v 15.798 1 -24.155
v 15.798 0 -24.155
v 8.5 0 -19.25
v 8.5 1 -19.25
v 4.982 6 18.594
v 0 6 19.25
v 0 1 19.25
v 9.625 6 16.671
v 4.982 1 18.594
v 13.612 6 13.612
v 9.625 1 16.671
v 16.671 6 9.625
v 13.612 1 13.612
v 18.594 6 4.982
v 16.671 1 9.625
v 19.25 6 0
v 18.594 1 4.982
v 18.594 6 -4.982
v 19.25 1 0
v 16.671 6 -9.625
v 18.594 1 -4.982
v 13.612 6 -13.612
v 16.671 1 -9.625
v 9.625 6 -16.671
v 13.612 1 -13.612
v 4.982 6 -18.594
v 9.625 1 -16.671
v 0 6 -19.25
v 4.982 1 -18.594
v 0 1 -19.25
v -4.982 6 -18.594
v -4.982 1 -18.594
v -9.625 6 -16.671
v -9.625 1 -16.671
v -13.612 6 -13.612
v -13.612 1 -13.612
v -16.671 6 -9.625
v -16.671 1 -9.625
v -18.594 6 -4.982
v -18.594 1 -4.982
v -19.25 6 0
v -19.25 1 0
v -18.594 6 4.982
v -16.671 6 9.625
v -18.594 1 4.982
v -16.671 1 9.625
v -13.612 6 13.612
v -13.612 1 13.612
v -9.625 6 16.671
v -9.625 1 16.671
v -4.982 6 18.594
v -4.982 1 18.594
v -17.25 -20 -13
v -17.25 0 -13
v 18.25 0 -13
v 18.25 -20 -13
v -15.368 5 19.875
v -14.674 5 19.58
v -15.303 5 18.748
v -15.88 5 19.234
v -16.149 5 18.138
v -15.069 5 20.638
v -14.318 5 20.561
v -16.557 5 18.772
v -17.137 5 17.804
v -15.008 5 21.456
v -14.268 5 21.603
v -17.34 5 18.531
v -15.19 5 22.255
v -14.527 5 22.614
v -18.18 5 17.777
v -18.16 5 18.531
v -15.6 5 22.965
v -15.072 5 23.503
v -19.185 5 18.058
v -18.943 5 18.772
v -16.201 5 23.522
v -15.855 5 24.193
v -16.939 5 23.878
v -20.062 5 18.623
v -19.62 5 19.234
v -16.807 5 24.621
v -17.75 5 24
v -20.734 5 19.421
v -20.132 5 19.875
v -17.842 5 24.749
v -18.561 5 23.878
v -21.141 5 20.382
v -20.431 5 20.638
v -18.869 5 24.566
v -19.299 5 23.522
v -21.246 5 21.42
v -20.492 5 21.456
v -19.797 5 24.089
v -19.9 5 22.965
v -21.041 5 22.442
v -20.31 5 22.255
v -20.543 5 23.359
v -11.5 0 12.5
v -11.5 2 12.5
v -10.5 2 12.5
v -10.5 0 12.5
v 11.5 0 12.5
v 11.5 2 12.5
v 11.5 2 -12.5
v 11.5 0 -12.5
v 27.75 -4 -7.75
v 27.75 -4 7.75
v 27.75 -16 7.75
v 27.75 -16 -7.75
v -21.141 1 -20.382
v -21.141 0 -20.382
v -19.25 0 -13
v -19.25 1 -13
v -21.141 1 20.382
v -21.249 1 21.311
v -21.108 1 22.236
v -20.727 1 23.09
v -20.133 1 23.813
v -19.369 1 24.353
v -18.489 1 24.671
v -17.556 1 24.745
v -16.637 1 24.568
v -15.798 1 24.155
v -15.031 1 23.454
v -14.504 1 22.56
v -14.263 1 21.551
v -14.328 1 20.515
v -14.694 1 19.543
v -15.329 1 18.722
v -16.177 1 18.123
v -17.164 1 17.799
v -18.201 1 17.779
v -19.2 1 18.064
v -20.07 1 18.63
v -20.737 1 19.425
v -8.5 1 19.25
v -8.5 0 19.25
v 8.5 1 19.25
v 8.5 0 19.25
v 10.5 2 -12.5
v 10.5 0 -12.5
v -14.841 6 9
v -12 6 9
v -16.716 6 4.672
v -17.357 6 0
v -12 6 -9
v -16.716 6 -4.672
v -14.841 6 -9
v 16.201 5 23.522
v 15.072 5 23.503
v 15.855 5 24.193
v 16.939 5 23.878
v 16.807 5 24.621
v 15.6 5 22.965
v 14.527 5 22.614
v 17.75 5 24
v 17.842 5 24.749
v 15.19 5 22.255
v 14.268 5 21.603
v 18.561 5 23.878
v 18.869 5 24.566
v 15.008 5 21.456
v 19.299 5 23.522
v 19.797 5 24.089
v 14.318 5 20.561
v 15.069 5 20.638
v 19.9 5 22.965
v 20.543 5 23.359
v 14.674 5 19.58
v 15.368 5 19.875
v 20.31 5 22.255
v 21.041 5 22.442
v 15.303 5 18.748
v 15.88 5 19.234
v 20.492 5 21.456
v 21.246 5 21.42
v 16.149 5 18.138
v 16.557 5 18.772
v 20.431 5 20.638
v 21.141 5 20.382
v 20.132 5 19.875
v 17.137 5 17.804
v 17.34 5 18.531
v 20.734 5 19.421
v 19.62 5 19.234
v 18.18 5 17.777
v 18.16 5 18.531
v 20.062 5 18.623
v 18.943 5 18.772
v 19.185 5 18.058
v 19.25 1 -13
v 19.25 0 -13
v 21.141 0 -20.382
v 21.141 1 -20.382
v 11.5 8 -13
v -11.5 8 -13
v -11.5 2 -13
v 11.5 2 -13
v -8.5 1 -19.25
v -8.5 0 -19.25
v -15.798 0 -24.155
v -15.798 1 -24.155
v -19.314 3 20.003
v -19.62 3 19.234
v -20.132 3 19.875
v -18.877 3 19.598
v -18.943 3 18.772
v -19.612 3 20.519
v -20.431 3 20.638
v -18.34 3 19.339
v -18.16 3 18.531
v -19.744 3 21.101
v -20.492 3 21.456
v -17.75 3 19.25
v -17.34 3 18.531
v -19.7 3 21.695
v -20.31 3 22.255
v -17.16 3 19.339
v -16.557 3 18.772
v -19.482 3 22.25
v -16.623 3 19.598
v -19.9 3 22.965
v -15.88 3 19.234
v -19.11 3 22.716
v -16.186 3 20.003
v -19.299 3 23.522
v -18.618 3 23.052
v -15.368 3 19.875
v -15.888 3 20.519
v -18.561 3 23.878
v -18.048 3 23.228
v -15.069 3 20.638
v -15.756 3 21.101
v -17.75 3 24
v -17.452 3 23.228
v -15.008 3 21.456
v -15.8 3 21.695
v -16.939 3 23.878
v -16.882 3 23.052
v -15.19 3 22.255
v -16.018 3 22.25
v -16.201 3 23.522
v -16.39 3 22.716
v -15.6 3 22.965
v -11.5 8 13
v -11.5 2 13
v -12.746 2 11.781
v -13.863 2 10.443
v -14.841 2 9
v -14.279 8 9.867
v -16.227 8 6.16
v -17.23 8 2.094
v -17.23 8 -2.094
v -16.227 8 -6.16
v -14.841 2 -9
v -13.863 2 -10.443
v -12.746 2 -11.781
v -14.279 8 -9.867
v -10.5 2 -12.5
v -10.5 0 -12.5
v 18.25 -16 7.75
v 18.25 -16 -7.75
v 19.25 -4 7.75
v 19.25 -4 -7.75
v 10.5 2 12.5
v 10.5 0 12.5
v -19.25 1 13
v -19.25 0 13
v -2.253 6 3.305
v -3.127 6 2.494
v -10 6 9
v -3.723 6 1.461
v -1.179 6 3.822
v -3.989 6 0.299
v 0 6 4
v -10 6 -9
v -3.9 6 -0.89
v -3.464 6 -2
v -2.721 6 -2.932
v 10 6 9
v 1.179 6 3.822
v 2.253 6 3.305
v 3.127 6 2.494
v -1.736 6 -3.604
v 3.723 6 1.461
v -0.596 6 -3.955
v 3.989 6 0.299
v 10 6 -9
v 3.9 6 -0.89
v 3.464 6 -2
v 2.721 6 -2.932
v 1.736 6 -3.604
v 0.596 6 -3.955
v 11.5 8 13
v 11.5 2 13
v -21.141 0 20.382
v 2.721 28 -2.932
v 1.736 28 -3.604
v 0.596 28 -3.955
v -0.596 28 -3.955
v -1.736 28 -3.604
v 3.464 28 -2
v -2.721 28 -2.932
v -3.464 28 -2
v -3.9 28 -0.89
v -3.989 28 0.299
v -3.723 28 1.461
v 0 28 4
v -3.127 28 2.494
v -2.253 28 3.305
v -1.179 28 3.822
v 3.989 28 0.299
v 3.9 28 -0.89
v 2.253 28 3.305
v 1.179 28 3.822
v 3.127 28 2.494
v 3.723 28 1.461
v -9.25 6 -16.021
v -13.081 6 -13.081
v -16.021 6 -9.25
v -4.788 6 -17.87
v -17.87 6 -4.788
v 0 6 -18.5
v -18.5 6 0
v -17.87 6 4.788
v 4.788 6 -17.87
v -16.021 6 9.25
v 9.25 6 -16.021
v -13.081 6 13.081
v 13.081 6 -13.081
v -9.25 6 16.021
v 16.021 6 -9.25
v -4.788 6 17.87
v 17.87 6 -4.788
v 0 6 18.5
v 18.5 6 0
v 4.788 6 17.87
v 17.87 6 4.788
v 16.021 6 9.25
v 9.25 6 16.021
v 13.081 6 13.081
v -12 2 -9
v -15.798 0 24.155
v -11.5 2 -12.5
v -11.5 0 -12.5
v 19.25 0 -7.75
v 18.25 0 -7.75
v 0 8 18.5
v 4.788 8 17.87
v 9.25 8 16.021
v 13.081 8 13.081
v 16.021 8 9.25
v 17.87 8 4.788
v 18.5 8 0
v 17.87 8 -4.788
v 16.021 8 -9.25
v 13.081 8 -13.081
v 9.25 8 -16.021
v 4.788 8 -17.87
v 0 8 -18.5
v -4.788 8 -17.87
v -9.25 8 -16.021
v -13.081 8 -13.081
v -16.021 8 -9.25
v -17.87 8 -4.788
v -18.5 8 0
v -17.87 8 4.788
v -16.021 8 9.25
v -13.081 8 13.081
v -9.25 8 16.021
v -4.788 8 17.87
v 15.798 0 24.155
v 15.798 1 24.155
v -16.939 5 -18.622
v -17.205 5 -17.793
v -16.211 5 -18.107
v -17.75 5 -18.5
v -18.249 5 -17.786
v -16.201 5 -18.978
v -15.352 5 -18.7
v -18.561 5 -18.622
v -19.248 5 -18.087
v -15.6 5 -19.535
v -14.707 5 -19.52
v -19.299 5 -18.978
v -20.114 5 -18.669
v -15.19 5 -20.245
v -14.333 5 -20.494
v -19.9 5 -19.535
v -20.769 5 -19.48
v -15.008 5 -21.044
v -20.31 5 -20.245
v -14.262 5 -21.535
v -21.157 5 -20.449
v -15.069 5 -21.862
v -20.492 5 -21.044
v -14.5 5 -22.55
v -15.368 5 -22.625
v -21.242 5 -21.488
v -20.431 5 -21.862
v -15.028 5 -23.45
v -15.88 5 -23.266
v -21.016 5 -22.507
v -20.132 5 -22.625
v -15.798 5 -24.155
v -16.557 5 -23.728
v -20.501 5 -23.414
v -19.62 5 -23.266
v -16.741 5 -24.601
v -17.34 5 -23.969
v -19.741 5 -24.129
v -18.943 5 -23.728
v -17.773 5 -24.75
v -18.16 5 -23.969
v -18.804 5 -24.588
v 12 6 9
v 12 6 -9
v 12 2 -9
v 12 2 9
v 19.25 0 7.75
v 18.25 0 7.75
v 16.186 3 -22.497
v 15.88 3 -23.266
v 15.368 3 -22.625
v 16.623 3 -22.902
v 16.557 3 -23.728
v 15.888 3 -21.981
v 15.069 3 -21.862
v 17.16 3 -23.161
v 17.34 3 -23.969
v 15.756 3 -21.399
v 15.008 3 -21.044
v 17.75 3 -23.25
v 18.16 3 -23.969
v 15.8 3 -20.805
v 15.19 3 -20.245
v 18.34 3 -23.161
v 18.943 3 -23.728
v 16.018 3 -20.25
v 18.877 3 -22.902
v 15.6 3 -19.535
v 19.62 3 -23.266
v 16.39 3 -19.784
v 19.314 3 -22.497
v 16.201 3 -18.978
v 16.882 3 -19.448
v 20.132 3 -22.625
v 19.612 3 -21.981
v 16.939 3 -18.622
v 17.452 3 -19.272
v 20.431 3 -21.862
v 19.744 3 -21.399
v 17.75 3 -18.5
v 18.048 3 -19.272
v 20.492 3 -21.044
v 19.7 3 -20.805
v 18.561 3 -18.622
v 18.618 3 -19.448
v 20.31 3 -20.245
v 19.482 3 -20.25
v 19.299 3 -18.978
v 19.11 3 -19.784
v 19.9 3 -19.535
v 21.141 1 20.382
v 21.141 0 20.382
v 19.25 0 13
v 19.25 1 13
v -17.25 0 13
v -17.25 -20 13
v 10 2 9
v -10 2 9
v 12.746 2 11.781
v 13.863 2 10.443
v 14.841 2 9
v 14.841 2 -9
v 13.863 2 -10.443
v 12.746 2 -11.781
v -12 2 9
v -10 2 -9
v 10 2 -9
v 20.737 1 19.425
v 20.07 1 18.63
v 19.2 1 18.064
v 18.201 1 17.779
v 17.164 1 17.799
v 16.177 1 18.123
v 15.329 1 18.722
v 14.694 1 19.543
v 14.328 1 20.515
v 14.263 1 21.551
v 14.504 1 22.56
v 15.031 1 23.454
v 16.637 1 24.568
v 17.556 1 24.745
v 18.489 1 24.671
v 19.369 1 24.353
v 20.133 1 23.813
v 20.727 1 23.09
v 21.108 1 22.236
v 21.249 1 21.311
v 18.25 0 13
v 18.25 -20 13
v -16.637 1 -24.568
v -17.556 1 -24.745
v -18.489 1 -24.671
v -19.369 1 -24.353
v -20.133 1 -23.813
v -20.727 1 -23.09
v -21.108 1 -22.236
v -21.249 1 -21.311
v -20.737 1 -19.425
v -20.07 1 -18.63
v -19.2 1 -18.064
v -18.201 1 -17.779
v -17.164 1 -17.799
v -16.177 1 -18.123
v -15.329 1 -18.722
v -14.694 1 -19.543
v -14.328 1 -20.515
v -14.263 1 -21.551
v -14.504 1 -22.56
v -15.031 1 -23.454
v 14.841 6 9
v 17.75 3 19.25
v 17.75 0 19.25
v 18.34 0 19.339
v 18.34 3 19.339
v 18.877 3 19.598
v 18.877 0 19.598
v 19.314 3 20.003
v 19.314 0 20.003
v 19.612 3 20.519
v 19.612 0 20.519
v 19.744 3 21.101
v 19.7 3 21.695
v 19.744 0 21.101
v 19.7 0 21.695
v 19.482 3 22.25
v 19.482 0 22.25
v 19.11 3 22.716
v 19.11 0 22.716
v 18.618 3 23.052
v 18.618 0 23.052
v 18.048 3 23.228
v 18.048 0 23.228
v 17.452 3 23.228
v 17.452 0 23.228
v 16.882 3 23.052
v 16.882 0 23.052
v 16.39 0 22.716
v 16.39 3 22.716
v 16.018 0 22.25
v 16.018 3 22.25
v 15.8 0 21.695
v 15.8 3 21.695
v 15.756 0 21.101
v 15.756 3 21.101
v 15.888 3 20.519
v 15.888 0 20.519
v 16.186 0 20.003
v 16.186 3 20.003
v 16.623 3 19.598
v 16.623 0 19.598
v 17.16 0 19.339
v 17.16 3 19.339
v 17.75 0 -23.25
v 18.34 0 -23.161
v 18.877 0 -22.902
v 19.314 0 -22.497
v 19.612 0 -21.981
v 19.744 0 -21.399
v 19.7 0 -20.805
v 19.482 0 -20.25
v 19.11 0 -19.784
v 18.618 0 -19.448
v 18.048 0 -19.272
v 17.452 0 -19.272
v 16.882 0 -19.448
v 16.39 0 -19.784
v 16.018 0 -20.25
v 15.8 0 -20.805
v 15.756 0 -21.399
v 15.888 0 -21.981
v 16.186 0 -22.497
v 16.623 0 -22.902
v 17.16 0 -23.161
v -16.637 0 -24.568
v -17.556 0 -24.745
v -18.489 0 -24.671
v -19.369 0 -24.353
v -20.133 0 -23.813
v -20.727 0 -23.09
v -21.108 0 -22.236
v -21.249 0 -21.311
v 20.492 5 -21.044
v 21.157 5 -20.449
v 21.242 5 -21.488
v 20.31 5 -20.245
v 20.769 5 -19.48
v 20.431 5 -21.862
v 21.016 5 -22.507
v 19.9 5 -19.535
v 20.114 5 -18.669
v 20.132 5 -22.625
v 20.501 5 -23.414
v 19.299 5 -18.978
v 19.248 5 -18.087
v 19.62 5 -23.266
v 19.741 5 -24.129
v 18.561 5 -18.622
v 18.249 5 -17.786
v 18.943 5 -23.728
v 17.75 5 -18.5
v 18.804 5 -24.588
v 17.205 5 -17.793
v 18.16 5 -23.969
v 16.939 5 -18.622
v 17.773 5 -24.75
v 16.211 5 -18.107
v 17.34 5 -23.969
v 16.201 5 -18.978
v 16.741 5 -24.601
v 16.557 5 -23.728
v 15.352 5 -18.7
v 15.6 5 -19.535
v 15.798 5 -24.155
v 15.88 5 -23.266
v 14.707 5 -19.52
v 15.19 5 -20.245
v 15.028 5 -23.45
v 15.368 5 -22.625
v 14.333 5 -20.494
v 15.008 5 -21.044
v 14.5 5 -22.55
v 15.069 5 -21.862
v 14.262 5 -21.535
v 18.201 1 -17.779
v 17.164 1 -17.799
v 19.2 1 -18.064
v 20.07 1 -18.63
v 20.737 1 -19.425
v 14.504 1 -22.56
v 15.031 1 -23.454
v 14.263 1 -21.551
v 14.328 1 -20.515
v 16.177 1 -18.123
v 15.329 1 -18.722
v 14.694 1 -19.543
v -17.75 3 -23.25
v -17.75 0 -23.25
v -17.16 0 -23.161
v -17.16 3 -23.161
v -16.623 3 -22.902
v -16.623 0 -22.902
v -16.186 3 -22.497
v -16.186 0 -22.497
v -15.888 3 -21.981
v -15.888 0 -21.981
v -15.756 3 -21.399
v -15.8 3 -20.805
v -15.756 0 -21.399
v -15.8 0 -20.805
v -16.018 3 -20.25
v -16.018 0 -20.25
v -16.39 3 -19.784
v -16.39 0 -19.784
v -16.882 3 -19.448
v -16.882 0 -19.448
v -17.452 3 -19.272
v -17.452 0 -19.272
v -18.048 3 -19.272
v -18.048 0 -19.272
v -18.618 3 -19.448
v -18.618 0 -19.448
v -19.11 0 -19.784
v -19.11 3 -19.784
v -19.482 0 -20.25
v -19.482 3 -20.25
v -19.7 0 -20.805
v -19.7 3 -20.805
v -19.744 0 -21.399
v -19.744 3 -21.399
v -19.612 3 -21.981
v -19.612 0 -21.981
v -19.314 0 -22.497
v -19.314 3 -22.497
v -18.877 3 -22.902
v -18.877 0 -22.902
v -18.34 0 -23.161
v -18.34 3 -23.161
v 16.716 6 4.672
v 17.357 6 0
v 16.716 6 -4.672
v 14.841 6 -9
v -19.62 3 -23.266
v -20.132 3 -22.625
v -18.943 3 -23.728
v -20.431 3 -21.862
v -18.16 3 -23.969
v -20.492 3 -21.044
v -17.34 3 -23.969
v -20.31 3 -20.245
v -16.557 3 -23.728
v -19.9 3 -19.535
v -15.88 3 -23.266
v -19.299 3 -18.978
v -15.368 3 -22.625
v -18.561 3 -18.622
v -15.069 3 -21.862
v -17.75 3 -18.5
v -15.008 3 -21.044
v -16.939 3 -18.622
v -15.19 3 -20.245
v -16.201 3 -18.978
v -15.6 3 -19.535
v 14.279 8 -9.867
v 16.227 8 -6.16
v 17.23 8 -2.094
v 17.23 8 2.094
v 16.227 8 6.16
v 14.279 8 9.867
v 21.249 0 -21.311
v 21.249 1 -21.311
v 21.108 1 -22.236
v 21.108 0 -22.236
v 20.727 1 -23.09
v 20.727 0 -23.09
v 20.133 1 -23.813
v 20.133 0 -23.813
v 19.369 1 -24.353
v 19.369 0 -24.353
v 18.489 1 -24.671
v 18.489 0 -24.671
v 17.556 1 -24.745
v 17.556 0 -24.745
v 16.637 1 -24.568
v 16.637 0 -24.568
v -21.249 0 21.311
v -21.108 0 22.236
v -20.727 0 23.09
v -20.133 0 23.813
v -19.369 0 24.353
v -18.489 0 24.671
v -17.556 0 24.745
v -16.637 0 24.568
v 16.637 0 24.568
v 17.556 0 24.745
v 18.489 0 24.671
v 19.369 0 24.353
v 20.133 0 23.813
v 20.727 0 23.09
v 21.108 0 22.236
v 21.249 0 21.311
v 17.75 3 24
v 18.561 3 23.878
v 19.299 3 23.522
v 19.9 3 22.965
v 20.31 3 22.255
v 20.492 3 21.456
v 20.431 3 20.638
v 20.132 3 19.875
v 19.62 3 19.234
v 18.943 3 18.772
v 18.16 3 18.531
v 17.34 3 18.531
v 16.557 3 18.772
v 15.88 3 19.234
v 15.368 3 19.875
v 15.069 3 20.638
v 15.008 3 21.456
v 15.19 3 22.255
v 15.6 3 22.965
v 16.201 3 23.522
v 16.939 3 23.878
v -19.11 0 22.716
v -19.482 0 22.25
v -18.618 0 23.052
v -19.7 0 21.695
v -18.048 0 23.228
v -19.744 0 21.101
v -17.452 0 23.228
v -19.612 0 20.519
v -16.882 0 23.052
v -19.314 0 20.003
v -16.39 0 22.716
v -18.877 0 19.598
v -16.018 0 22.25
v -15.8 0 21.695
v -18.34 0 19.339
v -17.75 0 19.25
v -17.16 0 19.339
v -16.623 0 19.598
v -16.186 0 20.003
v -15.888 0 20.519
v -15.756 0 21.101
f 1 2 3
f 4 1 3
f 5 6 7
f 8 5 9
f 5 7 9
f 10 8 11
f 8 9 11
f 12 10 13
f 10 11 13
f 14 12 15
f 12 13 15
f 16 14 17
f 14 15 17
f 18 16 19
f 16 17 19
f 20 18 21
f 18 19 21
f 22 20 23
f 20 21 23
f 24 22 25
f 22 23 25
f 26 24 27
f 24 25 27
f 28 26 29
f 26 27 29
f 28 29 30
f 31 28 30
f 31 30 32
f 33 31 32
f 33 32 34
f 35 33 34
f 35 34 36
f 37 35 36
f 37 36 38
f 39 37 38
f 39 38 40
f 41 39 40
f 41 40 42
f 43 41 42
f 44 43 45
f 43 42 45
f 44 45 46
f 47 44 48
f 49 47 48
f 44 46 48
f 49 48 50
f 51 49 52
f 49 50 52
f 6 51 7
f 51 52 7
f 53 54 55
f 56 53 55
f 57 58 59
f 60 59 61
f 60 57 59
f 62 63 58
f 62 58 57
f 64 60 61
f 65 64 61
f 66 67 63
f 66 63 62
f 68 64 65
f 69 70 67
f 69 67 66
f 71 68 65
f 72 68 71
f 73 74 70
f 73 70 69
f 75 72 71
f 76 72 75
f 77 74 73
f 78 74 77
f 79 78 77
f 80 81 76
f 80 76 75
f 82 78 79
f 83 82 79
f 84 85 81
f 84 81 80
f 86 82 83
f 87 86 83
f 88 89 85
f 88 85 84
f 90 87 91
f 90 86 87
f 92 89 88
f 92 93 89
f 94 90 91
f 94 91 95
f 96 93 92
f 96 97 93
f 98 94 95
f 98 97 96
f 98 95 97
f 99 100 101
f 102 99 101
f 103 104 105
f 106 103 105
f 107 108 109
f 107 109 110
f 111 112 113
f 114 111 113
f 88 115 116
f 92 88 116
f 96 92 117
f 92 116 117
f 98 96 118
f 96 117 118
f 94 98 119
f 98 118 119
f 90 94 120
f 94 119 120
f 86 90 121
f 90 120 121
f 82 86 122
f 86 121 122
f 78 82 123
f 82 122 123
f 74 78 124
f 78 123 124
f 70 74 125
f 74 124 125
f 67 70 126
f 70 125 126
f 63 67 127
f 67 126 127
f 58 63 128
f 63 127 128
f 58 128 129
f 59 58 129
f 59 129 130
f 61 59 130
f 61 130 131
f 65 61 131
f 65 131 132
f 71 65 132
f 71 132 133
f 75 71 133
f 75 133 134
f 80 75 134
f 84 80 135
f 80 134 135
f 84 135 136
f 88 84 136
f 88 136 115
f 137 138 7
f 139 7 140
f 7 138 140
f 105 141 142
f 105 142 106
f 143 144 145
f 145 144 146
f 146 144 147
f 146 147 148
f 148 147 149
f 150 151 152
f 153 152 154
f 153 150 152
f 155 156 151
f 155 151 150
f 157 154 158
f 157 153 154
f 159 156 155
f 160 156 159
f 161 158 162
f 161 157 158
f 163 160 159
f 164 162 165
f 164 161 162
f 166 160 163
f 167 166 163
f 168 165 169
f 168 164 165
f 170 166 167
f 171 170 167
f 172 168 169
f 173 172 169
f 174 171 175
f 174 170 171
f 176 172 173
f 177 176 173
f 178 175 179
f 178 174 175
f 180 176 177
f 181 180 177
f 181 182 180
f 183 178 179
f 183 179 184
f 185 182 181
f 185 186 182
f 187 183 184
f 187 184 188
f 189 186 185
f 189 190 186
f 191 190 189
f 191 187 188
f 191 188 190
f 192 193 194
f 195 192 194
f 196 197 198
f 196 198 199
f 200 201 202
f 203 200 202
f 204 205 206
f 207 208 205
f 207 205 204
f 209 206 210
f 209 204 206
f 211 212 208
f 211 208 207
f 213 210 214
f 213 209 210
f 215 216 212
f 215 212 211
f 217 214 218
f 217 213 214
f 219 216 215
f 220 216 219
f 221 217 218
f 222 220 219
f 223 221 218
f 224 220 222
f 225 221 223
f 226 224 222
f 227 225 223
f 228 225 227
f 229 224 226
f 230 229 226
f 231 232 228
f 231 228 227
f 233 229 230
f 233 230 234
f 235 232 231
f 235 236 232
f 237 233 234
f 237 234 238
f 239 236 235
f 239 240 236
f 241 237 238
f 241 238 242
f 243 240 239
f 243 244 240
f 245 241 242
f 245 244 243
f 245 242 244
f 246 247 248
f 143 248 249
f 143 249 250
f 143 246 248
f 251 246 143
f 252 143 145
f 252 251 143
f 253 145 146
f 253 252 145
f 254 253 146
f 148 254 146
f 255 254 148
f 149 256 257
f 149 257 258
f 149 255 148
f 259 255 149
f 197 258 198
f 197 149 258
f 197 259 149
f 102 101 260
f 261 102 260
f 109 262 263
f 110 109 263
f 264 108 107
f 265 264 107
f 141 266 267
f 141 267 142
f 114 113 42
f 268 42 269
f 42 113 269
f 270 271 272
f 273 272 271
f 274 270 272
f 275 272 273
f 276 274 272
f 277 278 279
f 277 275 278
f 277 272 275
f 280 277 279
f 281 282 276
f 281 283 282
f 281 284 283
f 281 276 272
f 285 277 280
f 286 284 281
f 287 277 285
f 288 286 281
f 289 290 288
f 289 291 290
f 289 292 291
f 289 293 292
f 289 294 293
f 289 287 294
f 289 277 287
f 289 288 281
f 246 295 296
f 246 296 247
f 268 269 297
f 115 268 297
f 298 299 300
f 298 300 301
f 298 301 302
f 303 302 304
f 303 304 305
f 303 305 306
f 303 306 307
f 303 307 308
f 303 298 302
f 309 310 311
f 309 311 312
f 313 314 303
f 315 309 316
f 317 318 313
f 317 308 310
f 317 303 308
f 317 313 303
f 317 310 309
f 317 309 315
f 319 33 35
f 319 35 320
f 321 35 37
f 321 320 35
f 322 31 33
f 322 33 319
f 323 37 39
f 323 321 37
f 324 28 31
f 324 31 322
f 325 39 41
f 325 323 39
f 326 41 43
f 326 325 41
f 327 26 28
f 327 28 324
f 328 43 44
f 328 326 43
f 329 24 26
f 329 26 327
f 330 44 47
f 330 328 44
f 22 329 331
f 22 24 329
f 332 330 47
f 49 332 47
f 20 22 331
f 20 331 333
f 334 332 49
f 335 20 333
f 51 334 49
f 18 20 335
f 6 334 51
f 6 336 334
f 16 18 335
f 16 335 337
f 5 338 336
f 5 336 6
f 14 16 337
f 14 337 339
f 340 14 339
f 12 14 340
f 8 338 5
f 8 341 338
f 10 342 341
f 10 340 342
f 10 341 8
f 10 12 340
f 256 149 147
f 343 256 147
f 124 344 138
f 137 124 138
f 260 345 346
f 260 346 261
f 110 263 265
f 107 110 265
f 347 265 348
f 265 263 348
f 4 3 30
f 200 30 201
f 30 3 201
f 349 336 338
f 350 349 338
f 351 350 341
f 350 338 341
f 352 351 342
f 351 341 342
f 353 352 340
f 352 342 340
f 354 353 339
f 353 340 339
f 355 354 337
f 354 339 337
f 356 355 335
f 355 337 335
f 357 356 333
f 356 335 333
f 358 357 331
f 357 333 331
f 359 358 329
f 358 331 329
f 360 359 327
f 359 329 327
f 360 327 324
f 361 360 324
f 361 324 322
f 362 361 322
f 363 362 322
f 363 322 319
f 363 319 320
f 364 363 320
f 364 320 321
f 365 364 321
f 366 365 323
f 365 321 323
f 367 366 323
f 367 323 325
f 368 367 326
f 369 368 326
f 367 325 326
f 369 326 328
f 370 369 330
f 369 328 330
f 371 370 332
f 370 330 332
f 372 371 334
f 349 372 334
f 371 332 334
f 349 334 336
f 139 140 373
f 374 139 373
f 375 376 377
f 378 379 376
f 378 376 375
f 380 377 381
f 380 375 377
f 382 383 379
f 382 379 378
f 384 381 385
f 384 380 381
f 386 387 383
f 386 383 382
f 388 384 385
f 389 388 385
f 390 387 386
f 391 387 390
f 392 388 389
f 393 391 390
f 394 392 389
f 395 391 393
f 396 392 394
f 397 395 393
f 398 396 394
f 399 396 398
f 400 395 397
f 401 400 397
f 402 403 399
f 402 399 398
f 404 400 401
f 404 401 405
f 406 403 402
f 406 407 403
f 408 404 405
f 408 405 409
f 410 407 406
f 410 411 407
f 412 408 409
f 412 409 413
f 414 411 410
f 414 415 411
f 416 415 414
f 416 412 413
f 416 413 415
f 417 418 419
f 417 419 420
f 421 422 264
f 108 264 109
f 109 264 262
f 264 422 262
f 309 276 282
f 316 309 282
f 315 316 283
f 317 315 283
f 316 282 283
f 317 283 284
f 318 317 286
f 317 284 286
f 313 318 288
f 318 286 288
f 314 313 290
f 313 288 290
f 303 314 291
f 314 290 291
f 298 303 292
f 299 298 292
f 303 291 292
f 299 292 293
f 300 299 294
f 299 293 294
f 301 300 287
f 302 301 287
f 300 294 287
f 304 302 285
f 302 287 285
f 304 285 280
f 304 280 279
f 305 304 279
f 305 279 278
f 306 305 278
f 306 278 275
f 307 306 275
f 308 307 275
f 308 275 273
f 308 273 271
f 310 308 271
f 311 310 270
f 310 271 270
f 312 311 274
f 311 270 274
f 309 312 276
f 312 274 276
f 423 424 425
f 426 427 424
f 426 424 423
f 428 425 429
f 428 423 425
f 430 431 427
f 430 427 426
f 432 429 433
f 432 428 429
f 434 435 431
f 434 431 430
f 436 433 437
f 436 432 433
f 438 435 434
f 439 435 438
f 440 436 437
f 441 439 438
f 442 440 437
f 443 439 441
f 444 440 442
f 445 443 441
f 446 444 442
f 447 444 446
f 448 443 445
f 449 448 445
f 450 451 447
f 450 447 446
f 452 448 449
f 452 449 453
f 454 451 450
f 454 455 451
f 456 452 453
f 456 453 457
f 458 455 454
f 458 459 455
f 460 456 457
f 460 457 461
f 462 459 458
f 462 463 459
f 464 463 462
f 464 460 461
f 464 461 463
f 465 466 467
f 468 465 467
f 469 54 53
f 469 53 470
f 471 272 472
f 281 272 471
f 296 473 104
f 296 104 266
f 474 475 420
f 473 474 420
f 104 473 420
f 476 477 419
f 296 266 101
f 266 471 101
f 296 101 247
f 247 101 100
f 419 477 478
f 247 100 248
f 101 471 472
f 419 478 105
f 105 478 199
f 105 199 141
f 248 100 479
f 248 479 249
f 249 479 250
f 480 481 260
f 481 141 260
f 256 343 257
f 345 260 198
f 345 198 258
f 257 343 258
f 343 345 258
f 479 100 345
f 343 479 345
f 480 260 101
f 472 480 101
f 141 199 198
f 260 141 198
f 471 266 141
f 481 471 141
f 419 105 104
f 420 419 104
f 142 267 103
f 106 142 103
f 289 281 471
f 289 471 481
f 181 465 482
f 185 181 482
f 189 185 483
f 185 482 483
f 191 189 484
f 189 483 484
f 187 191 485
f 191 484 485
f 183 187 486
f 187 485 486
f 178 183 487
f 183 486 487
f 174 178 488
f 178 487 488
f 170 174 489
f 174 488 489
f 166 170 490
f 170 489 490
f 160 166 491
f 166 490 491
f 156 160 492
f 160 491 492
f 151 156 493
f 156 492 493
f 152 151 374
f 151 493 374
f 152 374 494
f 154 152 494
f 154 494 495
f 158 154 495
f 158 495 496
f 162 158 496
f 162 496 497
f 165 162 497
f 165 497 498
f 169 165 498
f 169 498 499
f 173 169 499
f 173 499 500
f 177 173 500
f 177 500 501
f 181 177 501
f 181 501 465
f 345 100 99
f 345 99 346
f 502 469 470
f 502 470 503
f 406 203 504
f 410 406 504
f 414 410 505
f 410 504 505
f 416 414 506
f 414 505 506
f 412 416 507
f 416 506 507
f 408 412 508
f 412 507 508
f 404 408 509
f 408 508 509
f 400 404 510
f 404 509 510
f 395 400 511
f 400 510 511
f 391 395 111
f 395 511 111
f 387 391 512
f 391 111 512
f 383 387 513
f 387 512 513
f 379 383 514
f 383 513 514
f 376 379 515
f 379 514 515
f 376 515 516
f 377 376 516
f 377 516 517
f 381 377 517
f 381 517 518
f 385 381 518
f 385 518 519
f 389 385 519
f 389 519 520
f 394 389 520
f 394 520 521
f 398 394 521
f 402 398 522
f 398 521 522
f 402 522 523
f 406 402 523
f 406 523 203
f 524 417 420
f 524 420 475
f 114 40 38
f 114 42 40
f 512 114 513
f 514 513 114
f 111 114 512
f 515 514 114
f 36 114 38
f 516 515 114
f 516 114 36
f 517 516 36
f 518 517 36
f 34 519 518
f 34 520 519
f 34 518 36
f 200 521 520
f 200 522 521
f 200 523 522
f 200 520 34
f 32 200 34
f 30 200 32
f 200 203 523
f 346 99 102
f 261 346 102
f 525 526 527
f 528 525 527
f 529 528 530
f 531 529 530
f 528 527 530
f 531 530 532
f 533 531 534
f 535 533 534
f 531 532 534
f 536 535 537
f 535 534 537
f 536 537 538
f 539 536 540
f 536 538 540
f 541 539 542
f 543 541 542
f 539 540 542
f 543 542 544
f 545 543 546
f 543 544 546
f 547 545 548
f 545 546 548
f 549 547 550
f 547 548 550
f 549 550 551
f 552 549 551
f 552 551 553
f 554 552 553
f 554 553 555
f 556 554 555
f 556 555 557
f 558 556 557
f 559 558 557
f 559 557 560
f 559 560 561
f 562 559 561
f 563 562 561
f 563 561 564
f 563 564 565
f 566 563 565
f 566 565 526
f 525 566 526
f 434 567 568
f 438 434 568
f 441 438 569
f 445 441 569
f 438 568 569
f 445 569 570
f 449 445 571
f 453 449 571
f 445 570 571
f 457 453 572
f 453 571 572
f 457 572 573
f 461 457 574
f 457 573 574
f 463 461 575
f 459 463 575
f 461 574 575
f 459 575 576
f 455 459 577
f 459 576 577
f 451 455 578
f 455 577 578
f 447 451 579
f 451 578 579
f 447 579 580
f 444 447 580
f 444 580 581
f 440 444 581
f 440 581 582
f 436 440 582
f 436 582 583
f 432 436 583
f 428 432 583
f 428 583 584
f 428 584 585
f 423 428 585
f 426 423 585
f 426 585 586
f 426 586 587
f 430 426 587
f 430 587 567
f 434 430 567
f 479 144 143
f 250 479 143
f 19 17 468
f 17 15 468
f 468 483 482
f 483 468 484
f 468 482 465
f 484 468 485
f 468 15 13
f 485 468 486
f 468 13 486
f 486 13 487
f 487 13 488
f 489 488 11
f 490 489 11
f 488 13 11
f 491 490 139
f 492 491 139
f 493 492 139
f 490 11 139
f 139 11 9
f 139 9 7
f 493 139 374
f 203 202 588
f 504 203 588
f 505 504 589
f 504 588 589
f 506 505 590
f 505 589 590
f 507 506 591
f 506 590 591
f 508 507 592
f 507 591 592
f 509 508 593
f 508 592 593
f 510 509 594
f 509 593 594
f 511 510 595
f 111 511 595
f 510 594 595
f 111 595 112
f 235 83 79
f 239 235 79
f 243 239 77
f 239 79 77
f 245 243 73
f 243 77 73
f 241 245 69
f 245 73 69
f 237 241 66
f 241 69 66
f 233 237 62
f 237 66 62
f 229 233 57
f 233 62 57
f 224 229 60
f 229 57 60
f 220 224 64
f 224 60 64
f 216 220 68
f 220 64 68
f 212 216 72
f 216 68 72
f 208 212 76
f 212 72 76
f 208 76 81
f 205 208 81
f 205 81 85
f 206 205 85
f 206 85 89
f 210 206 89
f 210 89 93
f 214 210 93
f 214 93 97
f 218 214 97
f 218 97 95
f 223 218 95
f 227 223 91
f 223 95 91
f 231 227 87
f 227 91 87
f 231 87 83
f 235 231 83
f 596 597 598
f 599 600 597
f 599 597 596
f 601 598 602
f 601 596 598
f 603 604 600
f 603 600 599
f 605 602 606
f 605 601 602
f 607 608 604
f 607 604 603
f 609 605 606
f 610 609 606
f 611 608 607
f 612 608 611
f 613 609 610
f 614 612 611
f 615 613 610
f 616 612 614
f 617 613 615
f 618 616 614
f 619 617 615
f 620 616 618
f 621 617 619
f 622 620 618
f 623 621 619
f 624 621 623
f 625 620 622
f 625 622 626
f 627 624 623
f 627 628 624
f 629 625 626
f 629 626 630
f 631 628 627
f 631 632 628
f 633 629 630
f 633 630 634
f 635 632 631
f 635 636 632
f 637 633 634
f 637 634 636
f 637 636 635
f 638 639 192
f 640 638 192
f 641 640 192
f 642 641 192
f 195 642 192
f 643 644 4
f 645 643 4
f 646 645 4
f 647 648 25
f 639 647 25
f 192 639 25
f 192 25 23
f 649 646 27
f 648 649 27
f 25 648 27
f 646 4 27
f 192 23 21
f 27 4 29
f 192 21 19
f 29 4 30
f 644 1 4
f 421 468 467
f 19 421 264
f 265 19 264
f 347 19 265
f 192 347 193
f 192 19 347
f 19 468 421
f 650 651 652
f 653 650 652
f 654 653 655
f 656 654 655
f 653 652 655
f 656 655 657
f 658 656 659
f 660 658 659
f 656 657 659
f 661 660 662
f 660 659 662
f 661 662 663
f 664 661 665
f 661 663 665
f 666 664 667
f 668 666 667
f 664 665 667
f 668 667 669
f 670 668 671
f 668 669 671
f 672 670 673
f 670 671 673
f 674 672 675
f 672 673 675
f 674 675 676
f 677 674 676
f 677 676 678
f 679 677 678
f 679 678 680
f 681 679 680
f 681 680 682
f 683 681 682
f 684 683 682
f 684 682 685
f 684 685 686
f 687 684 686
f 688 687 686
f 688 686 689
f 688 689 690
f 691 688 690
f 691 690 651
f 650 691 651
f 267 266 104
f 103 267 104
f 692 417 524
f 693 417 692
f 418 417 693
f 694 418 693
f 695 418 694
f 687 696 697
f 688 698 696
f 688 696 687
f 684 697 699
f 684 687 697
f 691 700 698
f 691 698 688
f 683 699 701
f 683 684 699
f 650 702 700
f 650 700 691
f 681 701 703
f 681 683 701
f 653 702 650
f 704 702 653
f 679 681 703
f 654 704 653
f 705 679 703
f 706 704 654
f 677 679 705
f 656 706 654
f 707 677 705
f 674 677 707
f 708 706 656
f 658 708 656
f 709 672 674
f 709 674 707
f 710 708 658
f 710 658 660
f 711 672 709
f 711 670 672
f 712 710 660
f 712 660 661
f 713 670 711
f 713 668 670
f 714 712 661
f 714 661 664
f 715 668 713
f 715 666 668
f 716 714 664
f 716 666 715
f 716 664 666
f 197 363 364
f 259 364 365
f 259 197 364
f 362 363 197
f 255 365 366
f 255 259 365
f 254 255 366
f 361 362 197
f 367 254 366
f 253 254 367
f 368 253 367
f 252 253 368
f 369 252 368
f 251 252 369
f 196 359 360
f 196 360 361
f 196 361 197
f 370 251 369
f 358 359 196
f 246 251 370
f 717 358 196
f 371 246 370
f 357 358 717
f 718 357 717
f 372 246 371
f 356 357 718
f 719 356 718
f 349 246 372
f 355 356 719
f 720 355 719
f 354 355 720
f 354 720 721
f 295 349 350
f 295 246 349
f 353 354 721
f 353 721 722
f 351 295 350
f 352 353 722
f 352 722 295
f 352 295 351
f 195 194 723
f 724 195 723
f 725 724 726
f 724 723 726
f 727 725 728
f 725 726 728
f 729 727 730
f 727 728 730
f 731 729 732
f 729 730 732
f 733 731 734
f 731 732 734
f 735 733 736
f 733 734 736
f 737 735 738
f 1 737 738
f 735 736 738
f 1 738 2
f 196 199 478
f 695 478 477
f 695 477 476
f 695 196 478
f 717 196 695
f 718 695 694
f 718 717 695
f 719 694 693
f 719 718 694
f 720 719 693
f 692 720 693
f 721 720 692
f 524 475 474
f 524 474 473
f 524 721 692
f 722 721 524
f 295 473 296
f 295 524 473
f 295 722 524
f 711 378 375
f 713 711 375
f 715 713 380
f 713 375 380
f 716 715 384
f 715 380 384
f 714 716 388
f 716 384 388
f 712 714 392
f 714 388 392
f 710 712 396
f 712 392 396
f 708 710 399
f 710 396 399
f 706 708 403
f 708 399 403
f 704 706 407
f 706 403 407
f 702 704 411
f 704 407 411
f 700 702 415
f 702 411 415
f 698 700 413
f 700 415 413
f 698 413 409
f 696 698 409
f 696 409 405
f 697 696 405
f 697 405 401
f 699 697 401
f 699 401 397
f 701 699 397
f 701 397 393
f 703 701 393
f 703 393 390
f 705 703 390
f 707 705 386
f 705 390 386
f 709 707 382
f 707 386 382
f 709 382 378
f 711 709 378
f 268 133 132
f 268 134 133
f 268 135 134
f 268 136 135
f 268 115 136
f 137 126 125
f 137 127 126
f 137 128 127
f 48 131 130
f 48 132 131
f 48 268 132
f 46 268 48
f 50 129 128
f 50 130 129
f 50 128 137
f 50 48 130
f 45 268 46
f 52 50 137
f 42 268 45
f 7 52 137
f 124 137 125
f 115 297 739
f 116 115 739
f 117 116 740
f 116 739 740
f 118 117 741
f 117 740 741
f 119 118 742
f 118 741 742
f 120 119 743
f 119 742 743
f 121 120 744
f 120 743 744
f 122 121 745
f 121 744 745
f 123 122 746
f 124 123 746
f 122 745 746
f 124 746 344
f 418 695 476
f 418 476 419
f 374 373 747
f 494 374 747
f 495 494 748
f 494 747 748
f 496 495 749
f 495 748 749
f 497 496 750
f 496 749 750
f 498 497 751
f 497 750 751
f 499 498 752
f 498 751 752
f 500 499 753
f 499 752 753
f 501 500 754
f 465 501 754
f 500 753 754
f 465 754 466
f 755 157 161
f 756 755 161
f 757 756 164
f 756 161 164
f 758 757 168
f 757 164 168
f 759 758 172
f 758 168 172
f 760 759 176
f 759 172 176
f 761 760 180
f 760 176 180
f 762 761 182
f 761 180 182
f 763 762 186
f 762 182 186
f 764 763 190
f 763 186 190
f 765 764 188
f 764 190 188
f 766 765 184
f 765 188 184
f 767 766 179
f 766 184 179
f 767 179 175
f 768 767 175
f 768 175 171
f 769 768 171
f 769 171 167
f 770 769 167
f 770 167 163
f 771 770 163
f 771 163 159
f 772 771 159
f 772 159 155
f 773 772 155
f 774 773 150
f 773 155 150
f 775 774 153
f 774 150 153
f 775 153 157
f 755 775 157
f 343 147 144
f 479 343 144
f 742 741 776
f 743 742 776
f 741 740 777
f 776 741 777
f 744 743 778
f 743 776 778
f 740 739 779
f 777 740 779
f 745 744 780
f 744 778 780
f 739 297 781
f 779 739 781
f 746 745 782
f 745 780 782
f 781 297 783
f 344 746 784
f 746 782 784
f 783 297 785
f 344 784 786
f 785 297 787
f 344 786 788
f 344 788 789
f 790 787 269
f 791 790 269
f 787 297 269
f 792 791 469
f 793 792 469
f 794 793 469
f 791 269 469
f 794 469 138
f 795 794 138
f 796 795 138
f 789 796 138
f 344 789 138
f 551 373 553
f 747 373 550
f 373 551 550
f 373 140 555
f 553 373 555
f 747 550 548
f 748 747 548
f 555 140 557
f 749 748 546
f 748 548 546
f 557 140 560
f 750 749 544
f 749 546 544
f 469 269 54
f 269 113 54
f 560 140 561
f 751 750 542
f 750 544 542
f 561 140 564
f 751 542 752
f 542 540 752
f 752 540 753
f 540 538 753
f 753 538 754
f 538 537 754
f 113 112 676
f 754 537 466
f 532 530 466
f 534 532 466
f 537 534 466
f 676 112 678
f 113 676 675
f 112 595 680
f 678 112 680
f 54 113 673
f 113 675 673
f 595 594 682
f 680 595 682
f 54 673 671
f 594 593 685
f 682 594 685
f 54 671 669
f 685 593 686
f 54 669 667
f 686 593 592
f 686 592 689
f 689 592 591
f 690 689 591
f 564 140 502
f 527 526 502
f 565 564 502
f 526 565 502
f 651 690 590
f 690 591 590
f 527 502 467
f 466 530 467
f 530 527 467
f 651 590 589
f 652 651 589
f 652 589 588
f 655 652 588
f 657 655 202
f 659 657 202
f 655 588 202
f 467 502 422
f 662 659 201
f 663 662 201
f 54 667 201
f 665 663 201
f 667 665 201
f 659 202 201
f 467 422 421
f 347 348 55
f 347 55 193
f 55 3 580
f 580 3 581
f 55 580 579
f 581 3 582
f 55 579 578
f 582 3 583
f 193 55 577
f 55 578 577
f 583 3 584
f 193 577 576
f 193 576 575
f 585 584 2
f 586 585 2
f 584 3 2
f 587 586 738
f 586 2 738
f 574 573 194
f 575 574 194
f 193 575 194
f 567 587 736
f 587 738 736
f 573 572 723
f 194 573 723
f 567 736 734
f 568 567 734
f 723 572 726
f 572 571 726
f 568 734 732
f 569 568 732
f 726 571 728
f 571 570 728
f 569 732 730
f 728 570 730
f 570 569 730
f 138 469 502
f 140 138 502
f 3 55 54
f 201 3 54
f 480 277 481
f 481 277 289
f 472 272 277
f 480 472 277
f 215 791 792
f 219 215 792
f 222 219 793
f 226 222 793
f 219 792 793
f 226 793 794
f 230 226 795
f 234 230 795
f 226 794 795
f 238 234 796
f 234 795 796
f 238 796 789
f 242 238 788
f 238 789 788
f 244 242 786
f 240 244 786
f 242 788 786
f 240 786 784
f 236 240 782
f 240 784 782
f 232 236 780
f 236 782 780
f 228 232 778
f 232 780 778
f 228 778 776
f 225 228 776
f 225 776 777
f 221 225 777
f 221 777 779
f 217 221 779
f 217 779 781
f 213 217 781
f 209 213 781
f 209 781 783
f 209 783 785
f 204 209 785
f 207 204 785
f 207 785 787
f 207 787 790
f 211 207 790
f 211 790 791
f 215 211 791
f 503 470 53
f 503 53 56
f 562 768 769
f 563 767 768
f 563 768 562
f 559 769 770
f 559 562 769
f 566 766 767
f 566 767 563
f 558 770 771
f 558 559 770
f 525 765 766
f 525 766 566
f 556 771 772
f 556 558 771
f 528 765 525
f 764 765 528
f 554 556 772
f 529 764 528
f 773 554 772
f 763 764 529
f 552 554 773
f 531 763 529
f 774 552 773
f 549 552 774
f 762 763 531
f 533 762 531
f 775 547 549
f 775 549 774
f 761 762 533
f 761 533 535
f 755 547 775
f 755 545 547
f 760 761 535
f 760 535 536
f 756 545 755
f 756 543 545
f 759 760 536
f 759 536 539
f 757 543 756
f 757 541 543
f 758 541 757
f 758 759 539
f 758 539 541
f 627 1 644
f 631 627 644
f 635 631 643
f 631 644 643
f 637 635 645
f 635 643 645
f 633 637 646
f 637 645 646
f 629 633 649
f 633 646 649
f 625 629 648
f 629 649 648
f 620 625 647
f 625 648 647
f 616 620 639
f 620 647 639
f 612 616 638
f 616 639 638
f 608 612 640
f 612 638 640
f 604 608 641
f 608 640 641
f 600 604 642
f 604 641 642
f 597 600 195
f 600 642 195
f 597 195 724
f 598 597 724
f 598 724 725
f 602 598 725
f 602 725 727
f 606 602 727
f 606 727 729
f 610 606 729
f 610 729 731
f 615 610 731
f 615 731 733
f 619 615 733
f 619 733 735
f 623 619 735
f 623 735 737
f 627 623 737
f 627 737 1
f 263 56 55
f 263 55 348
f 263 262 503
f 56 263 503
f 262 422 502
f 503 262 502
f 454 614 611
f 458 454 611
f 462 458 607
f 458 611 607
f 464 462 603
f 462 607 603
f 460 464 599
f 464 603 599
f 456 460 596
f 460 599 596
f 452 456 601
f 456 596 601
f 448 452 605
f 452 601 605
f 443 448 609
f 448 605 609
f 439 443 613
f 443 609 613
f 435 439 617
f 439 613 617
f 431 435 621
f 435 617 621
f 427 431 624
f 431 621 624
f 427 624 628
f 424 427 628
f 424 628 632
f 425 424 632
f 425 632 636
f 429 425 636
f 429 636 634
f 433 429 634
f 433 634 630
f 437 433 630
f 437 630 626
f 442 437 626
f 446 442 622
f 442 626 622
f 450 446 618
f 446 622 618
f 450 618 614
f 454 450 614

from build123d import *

# Parameters (mm, degrees)
SKETCH4_R           = 3.5
SKETCH4_R_2         = 19.25
BOSS_EXTRUDE1_DEPTH = 1
SKETCH5_R           = 19.25
BOSS_EXTRUDE2_DEPTH = 5
SKETCH6_R           = 18.5
BOSS_EXTRUDE3_DEPTH = 2
CUT_EXTRUDE1_DEPTH  = 6
SKETCH8_W           = 1
SKETCH8_H           = 25
CUT_EXTRUDE2_DEPTH  = 6
BOSS_EXTRUDE4_START = 4
SKETCH9_W           = 20
SKETCH9_H           = 18
BOSS_EXTRUDE4_DEPTH = 4
SKETCH10_R          = 4
BOSS_EXTRUDE5_DEPTH = 22
SKETCH11_R          = 3.5
BOSS_EXTRUDE6_DEPTH = 4
SKETCH12_R          = 2.75
CUT_EXTRUDE3_DEPTH  = 2
SKETCH13_R          = 1.5
CUT_EXTRUDE4_DEPTH  = 7
SKETCH14_W          = 35.5
SKETCH14_H          = 26
BOSS_EXTRUDE7_DEPTH = 20
BOSS_EXTRUDE8_DEPTH = 9.5
SKETCH16_W          = 15.5
SKETCH16_H          = 5
CUT_EXTRUDE5_DEPTH  = 8.5
SKETCH17_R          = 2
CUT_EXTRUDE6_DEPTH  = 4


with BuildPart() as part:
    # Sketch4 → Boss-Extrude1 (new body)
    with BuildSketch(Plane(origin=(0, 0, 0), x_dir=(1, 0, 0), z_dir=(0, 1, 0))):
        with Locations((-17.75, -21.25)):
            Circle(SKETCH4_R)
        with BuildLine():
            ThreePointArc((3e-08, -19.25), (-13.611805493, -13.611805583), (-19.25, -9.7e-08))
            Line((-19.25, -9.7e-08), (-19.25, -13))
            Line((-19.25, -13), (-21.140562134, -20.381617358))
            ThreePointArc((-21.140562134, -20.381617358), (-17.312374287, -17.777467245), (-14.25, -21.25))
            ThreePointArc((-14.25, -21.25), (-14.66103595, -22.895691677), (-15.797600627, -24.154847102))
            Line((-15.797600627, -24.154847102), (-8.5, -19.25))
            Line((-8.5, -19.25), (3e-08, -19.25))
        make_face()
        Circle(SKETCH4_R_2)
        with BuildLine():
            Line((19.25, -13), (19.25, 0))
            ThreePointArc((19.25, 0), (13.611805548, -13.611805527), (3e-08, -19.25))
            Line((3e-08, -19.25), (8.5, -19.25))
            Line((8.5, -19.25), (15.797600627, -24.154847102))
            ThreePointArc((15.797600627, -24.154847102), (15.7309919, -18.391048043), (21.140562134, -20.381617358))
            Line((21.140562134, -20.381617358), (19.25, -13))
        make_face()
        with Locations((17.75, -21.25)):
            Circle(SKETCH4_R)
        with BuildLine():
            Line((8.5, 19.25), (0, 19.25))
            ThreePointArc((0, 19.25), (13.611805538, 13.611805538), (19.25, 0))
            Line((19.25, 0), (19.25, 13))
            Line((19.25, 13), (21.140562134, 20.381617358))
            ThreePointArc((21.140562134, 20.381617358), (15.7309919, 18.391048043), (15.797600627, 24.154847102))
            Line((15.797600627, 24.154847102), (8.5, 19.25))
        make_face()
        with Locations((17.75, 21.25)):
            Circle(SKETCH4_R)
        with BuildLine():
            Line((-8.5, 19.25), (-15.797600627, 24.154847102))
            ThreePointArc((-15.797600627, 24.154847102), (-14.66103595, 22.895691677), (-14.25, 21.25))
            ThreePointArc((-14.25, 21.25), (-17.312374287, 17.777467245), (-21.140562134, 20.381617358))
            Line((-21.140562134, 20.381617358), (-19.25, 13))
            Line((-19.25, 13), (-19.25, -9.7e-08))
            ThreePointArc((-19.25, -9.7e-08), (-13.611805572, 13.611805504), (0, 19.25))
            Line((0, 19.25), (-8.5, 19.25))
        make_face()
        with Locations((-17.75, 21.25)):
            Circle(SKETCH4_R)
    extrude(amount=BOSS_EXTRUDE1_DEPTH)

    # Sketch5 → Boss-Extrude2 (add)
    with BuildSketch(Plane(origin=(0, 1, 0), x_dir=(1, 0, 0), z_dir=(0, 1, 0))):
        with Locations(Location((0, 0, 0), (0, 0, 270))):
            Circle(SKETCH5_R)
    extrude(amount=BOSS_EXTRUDE2_DEPTH)

    # Sketch6 → Boss-Extrude3 (add)
    with BuildSketch(Plane(origin=(0, 6, 0), x_dir=(1, 0, 0), z_dir=(0, 1, 0))):
        with Locations(Location((0, 0, 0), (0, 0, 270))):
            Circle(SKETCH6_R)
    extrude(amount=BOSS_EXTRUDE3_DEPTH)

    # Sketch7 → Cut-Extrude1 (cut)
    with BuildSketch(Plane(origin=(0, 8, 0), x_dir=(1, 0, 0), z_dir=(0, 1, 0))):
        with BuildLine():
            Line((-11.5, 13), (11.5, 13))
            ThreePointArc((11.5, 13), (17.356554958, 0), (11.5, -13))
            Line((11.5, -13), (-11.5, -13))
            ThreePointArc((-11.5, -13), (-17.356554958, 0), (-11.5, 13))
        make_face()
    extrude(amount=-CUT_EXTRUDE1_DEPTH, mode=Mode.SUBTRACT)

    # Sketch8 → Cut-Extrude2 (cut)
    with BuildSketch(Plane(origin=(0, 2, 0), x_dir=(1, 0, 0), z_dir=(0, 1, 0))):
        with Locations((-11, 0)):
            Rectangle(SKETCH8_W, SKETCH8_H)
        with Locations((11, 0)):
            Rectangle(SKETCH8_W, SKETCH8_H)
    extrude(amount=-CUT_EXTRUDE2_DEPTH, mode=Mode.SUBTRACT)

    # Sketch9 → Boss-Extrude4 (add)
    with BuildSketch(Plane(origin=(0, 2, 0), x_dir=(1, 0, 0), z_dir=(0, 1, 0)).offset(BOSS_EXTRUDE4_START)):
        Rectangle(SKETCH9_W, SKETCH9_H)
        with BuildLine():
            Line((-14.84082208, 9), (-12, 9))
            Line((-12, 9), (-12, -9))
            Line((-12, -9), (-14.84082208, -9))
            ThreePointArc((-14.84082208, -9), (-17.356554958, 0), (-14.84082208, 9))
        make_face()
        with BuildLine():
            Line((12, -9), (14.84082208, -9))
            ThreePointArc((14.84082208, -9), (17.356554958, 0), (14.84082208, 9))
            Line((14.84082208, 9), (12, 9))
            Line((12, 9), (12, -9))
        make_face()
    extrude(amount=-BOSS_EXTRUDE4_DEPTH)

    # Sketch10 → Boss-Extrude5 (add)
    with BuildSketch(Plane(origin=(0, 6, 0), x_dir=(1, 0, 0), z_dir=(0, 1, 0))):
        with Locations(Location((0, 0, 0), (0, 0, 270))):
            Circle(SKETCH10_R)
    extrude(amount=BOSS_EXTRUDE5_DEPTH)

    # Sketch11 → Boss-Extrude6 (add)
    with BuildSketch(Plane(origin=(0, 1, 0), x_dir=(1, 0, 0), z_dir=(0, 1, 0))):
        with Locations(Location((-17.75, 21.25, 0), (0, 0, 56.094250748))):
            Circle(SKETCH11_R)
        with Locations(Location((17.75, 21.25, 0), (0, 0, 123.905749252))):
            Circle(SKETCH11_R)
        with Locations(Location((17.75, -21.25, 0), (0, 0, 14.365660019))):
            Circle(SKETCH11_R)
        with Locations(Location((-17.75, -21.25, 0), (0, 0, 165.634339981))):
            Circle(SKETCH11_R)
    extrude(amount=BOSS_EXTRUDE6_DEPTH)

    # Sketch12 → Cut-Extrude3 (cut)
    with BuildSketch(Plane(origin=(0, 5, 0), x_dir=(1, 0, 0), z_dir=(0, 1, 0))):
        with Locations(Location((-17.75, 21.25, 0), (0, 0, 270))):
            Circle(SKETCH12_R)
        with Locations(Location((17.75, 21.25, 0), (0, 0, 270))):
            Circle(SKETCH12_R)
        with Locations(Location((17.75, -21.25, 0), (0, 0, 270))):
            Circle(SKETCH12_R)
        with Locations(Location((-17.75, -21.25, 0), (0, 0, 270))):
            Circle(SKETCH12_R)
    extrude(amount=-CUT_EXTRUDE3_DEPTH, mode=Mode.SUBTRACT)

    # Sketch13 → Cut-Extrude4 (cut)
    with BuildSketch(Plane(origin=(0, 3, 0), x_dir=(1, 0, 0), z_dir=(0, 1, 0))):
        with Locations(Location((-17.75, 21.25, 0), (0, 0, 270))):
            Circle(SKETCH13_R)
        with Locations(Location((17.75, 21.25, 0), (0, 0, 270))):
            Circle(SKETCH13_R)
        with Locations(Location((17.75, -21.25, 0), (0, 0, 270))):
            Circle(SKETCH13_R)
        with Locations(Location((-17.75, -21.25, 0), (0, 0, 270))):
            Circle(SKETCH13_R)
    extrude(amount=-CUT_EXTRUDE4_DEPTH, mode=Mode.SUBTRACT)

    # Sketch14 → Boss-Extrude7 (add)
    with BuildSketch(Plane.XZ):
        with Locations((0.5, 0)):
            Rectangle(SKETCH14_W, SKETCH14_H)
    extrude(amount=BOSS_EXTRUDE7_DEPTH)

    # Sketch15 → Boss-Extrude8 (add)
    with BuildSketch(Plane(origin=(18.25, 0, 0), x_dir=(0, 0, -1), z_dir=(1, 0, 0))):
        Polygon((-7.75, 0), (-7.75, -16), (7.75, -16), (7.75, 0), (7.75, 1), (-7.75, 1), align=None)
    extrude(amount=BOSS_EXTRUDE8_DEPTH)

    # Sketch16 → Cut-Extrude5 (cut)
    with BuildSketch(Plane(origin=(27.75, 0, 0), x_dir=(0, 0, -1), z_dir=(1, 0, 0))):
        with Locations((0, -1.5)):
            Rectangle(SKETCH16_W, SKETCH16_H)
    extrude(amount=-CUT_EXTRUDE5_DEPTH, mode=Mode.SUBTRACT)

    # Sketch17 → Cut-Extrude6 (cut)
    with BuildSketch(Plane.XZ):
        with Locations(Location((-17.75, 21.25, 0), (0, 0, 270))):
            Circle(SKETCH17_R)
        with Locations(Location((17.75, 21.25, 0), (0, 0, 270))):
            Circle(SKETCH17_R)
        with Locations(Location((17.75, -21.25, 0), (0, 0, 270))):
            Circle(SKETCH17_R)
        with Locations(Location((-17.75, -21.25, 0), (0, 0, 270))):
            Circle(SKETCH17_R)
    extrude(amount=-CUT_EXTRUDE6_DEPTH, mode=Mode.SUBTRACT)


solid = part.part
